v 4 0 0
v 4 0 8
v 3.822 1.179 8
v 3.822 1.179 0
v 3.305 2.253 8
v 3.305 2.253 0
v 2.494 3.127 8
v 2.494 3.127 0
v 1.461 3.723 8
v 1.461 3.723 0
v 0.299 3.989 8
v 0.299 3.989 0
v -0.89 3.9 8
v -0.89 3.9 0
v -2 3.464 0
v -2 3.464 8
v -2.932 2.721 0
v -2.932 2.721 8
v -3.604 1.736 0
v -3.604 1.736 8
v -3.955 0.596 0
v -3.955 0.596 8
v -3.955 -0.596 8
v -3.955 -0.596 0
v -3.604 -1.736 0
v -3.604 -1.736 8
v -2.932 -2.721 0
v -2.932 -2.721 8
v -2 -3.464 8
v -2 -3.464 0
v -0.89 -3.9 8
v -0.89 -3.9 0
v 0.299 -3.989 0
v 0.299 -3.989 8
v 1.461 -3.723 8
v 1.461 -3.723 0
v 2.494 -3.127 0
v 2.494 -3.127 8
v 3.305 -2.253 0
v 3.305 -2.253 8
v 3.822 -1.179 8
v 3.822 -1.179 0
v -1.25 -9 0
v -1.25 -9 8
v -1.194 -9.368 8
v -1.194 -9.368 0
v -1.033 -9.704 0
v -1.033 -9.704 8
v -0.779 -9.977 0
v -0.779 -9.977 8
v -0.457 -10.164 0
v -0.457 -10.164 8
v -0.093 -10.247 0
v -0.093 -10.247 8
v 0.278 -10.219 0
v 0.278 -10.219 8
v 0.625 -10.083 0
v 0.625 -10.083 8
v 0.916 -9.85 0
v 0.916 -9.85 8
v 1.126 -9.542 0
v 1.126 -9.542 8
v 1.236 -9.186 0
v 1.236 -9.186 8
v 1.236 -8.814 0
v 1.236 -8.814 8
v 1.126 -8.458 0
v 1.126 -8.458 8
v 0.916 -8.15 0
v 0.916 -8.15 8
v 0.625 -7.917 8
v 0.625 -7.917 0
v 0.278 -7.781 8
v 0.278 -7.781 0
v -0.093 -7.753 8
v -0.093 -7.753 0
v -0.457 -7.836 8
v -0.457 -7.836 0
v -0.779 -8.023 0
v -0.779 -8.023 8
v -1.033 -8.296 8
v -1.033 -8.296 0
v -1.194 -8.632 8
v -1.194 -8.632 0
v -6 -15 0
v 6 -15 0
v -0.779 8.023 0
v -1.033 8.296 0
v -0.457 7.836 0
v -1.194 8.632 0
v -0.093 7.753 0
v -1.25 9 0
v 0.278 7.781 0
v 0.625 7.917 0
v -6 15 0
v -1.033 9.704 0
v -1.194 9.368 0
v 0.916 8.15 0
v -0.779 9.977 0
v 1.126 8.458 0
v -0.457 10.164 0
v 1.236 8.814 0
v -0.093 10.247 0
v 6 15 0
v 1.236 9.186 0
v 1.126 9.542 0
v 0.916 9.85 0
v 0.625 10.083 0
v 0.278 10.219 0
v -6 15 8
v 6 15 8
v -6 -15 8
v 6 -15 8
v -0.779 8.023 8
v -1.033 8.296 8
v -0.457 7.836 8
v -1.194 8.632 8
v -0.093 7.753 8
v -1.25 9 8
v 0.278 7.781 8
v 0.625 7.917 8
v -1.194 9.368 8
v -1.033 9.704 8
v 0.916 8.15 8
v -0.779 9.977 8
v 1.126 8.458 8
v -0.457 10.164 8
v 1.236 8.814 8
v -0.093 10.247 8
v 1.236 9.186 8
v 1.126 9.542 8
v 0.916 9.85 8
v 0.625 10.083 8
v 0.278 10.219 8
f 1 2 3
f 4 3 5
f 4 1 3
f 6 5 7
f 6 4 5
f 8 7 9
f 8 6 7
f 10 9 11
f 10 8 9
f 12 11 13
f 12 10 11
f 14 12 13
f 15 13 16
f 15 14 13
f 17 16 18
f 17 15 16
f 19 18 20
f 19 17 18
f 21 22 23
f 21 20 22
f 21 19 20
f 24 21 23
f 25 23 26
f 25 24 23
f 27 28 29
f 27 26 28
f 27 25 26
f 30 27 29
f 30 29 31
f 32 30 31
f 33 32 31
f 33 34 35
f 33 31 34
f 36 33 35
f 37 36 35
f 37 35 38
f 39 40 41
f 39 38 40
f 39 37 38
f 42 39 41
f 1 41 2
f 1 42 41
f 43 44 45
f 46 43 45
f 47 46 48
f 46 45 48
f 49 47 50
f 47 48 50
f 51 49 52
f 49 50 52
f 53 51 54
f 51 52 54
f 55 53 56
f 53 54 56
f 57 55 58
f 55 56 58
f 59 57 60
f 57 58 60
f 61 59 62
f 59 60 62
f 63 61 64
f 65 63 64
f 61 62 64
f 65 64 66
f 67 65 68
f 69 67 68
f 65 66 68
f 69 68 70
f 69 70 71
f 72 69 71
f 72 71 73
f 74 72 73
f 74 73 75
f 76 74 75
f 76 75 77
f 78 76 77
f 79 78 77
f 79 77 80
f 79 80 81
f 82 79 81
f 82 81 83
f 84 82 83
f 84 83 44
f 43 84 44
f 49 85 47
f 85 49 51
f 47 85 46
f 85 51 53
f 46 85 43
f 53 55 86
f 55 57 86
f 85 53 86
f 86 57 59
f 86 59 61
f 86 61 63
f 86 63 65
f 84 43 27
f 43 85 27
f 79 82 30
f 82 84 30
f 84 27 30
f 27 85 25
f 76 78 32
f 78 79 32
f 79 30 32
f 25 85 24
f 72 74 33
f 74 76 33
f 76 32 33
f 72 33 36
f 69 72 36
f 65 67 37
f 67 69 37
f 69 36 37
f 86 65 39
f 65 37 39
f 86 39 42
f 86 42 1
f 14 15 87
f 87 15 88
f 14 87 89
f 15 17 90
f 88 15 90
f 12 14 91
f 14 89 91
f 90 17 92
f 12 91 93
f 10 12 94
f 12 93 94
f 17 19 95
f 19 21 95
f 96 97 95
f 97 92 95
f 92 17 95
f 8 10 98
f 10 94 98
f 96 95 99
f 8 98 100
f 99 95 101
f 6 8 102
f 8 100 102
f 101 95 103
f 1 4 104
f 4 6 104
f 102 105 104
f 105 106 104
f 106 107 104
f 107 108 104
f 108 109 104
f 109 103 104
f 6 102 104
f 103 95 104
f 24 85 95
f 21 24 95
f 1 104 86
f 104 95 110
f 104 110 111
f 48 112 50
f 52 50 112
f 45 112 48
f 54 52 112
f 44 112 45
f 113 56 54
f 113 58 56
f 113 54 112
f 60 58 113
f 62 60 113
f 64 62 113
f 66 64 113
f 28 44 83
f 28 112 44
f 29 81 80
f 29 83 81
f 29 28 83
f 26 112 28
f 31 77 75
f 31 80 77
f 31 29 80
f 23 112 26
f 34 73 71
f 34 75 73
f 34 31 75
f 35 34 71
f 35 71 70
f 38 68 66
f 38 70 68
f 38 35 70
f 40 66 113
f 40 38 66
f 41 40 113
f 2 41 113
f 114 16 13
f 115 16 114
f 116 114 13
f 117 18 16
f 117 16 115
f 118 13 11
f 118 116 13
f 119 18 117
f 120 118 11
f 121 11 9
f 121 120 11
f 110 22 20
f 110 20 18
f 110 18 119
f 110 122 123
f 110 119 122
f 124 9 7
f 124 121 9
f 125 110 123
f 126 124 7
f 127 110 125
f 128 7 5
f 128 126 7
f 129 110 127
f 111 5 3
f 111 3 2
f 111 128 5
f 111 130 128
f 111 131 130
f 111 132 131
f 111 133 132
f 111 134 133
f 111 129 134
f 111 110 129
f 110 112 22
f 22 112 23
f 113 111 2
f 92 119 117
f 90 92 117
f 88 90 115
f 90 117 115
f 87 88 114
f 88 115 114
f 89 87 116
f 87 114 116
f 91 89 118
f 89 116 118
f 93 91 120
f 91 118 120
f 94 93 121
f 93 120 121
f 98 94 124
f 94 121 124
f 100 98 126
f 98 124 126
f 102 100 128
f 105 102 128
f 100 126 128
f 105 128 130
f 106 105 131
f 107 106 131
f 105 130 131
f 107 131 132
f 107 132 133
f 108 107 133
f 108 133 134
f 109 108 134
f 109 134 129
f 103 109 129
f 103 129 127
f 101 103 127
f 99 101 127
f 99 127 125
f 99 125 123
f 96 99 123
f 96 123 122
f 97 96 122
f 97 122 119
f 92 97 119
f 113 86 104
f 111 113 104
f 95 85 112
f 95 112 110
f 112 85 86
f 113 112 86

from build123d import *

# Parameters (mm, degrees)
F0_W     = 12
F0_H     = 30
F1_DEPTH = 8
F2_R     = 4
F3_DEPTH = 8.001
F5_D     = 2.5


with BuildPart() as f1:
    # F0 (on Top) → F1 (new body)
    with BuildSketch(Plane.XY):
        Rectangle(F0_W, F0_H)
    extrude(amount=F1_DEPTH)

    # F2 (on Top) → F3 (cut, through all)
    with BuildSketch(Plane.XY):
        Circle(F2_R)
    extrude(amount=F3_DEPTH, mode=Mode.SUBTRACT)

    # F5 (through all)
    with Locations(Plane(origin=(0, 0, 0), x_dir=(1, 0, 0), z_dir=(0, 0, -1))):
        with Locations((0, -9), (0, 9)):
            Hole(F5_D / 2)


solid = f1.part
